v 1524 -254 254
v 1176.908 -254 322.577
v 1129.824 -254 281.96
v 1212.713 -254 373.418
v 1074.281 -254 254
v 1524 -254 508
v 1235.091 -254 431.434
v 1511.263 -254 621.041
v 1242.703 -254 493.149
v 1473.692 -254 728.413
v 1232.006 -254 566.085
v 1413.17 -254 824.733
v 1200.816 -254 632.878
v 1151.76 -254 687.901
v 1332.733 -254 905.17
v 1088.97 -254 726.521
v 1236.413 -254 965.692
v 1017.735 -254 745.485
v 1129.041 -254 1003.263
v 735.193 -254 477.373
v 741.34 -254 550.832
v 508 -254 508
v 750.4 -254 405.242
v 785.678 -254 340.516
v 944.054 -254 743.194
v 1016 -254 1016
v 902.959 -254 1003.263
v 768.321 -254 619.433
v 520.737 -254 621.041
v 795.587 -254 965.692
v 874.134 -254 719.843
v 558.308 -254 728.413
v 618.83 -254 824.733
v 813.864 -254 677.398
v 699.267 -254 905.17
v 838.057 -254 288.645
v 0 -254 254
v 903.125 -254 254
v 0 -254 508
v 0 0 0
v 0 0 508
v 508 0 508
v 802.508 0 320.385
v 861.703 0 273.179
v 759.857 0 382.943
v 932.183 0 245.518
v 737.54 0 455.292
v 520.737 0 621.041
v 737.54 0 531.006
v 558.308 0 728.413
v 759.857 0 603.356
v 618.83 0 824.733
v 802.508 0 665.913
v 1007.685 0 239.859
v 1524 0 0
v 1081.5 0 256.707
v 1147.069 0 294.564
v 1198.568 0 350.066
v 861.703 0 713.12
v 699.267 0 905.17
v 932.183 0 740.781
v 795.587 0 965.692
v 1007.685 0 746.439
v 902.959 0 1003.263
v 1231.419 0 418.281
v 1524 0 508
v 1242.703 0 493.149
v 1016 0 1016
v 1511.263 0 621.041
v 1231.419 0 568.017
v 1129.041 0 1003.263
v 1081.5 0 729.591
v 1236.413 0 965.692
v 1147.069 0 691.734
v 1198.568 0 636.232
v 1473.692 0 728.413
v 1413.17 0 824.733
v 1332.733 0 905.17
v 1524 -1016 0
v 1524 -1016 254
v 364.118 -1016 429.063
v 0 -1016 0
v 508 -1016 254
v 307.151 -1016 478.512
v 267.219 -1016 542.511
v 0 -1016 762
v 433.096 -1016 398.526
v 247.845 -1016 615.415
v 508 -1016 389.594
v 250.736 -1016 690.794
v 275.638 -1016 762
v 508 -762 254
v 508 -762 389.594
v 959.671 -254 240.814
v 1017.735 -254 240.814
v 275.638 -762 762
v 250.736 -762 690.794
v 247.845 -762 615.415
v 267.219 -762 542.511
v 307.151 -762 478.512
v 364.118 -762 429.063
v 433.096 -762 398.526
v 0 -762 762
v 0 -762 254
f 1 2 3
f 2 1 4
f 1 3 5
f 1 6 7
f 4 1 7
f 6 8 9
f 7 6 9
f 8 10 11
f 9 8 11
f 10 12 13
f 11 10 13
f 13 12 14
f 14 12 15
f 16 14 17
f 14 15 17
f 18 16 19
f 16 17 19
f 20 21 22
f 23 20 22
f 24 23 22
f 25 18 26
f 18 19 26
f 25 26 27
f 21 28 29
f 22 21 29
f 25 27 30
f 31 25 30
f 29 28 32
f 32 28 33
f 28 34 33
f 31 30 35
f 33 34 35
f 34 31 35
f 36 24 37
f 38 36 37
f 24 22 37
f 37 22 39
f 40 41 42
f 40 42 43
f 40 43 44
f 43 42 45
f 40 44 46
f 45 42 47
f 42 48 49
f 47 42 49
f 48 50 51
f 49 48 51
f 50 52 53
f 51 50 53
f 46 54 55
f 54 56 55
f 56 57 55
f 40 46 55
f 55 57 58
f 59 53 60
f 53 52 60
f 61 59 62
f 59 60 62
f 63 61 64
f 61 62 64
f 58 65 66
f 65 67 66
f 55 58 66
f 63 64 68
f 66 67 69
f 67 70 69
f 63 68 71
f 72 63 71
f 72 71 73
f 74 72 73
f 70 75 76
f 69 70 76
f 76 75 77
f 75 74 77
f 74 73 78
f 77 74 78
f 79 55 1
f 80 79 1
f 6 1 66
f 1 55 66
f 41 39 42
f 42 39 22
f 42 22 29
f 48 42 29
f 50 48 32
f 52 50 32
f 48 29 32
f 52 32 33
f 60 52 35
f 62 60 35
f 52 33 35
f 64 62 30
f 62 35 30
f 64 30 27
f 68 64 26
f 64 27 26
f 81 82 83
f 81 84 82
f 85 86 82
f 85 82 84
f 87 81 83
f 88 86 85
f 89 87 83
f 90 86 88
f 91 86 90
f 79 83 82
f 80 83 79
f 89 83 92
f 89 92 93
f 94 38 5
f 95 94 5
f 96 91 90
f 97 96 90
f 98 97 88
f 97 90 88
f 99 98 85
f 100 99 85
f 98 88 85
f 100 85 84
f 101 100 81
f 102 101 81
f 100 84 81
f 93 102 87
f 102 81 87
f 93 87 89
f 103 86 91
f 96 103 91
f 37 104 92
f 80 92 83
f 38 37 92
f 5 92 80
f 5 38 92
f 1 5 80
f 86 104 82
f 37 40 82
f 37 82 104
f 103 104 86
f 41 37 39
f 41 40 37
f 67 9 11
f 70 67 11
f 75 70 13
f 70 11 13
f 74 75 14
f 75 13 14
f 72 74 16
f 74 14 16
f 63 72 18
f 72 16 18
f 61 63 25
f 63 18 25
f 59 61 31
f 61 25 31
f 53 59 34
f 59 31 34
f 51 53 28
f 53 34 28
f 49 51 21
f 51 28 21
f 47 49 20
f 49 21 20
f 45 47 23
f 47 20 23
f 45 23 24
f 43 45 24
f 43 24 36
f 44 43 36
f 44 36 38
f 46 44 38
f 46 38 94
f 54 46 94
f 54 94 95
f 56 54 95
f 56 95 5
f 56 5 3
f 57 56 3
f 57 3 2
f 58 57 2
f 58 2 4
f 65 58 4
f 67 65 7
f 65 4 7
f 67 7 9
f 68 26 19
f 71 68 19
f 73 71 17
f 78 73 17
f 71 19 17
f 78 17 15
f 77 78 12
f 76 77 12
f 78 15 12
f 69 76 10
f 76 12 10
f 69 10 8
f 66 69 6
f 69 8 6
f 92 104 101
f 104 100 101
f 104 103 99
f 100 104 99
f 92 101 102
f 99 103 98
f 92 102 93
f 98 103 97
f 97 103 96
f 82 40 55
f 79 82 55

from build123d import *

# Parameters (mm, degrees)
F0_W      = 1524
F0_H      = 1016
F1_DEPTH  = 1016
F2_W      = 1016
F2_H      = 762
F3_DEPTH  = 254
F5_DEPTH  = 762
F6_W      = 508
F6_H      = 254
F7_DEPTH  = 254
F8_W      = 508
F8_H      = 508
F9_DEPTH  = 254
F11_DEPTH = 254
F12_R     = 254
F13_DEPTH = 254
F15_DEPTH = 254


with BuildPart() as f1:
    # F0 (on Front) → F1 (new body)
    with BuildSketch(Plane.XZ):
        with Locations((762, 508)):
            Rectangle(F0_W, F0_H)
    extrude(amount=F1_DEPTH)

    # F2 (on face) → F3 (cut)
    with BuildSketch(Plane.XZ.offset(1016)):
        with Locations((1016, 635)):
            Rectangle(F2_W, F2_H)
    extrude(amount=-F3_DEPTH, mode=Mode.SUBTRACT)

    # F4 (on face) → F5 (cut)
    with BuildSketch(Plane.XY.offset(1016)):
        Polygon((0, -762), (508, -762), (1524, -762), (1524, -254), (0, -254), align=None)
    extrude(amount=-F5_DEPTH, mode=Mode.SUBTRACT)

    # F6 (on face) → F7 (cut)
    with BuildSketch(Plane.XZ.offset(1016)):
        with Locations((254, 889)):
            Rectangle(F6_W, F6_H)
    extrude(amount=-F7_DEPTH, mode=Mode.SUBTRACT)

    # F8 (on face) → F9 (cut)
    with BuildSketch(Plane.XZ.offset(254)):
        with Locations((254, 762)):
            Rectangle(F8_W, F8_H)
    extrude(amount=-F9_DEPTH, mode=Mode.SUBTRACT)

    # F10 (on face) → F11 (cut)
    with BuildSketch(Plane.XZ.offset(254)):
        with BuildLine():
            Line((1524, 1016), (1016, 1016))
            ThreePointArc((1016, 1016), (1375.210245, 867.210245), (1524, 508))
            Line((1524, 508), (1524, 1016))
        make_face()
        with BuildLine():
            Line((508, 1016), (508, 508))
            ThreePointArc((508, 508), (656.789755, 867.210245), (1016, 1016))
            Line((1016, 1016), (508, 1016))
        make_face()
    extrude(amount=-F11_DEPTH, mode=Mode.SUBTRACT)

    # F12 (on face) → F13 (cut)
    with BuildSketch(Plane.XZ.offset(254)):
        with Locations((988.703072, 493.149191)):
            Circle(F12_R)
    extrude(amount=-F13_DEPTH, mode=Mode.SUBTRACT)

    # F14 (on face) → F15 (cut)
    with BuildSketch(Plane.XZ.offset(1016)):
        with BuildLine():
            Line((508, 762), (275.637895, 762))
            ThreePointArc((275.637895, 762), (284.796354, 509.020591), (508, 389.5945))
            Line((508, 389.5945), (508, 762))
        make_face()
    extrude(amount=-F15_DEPTH, mode=Mode.SUBTRACT)


solid = f1.part
